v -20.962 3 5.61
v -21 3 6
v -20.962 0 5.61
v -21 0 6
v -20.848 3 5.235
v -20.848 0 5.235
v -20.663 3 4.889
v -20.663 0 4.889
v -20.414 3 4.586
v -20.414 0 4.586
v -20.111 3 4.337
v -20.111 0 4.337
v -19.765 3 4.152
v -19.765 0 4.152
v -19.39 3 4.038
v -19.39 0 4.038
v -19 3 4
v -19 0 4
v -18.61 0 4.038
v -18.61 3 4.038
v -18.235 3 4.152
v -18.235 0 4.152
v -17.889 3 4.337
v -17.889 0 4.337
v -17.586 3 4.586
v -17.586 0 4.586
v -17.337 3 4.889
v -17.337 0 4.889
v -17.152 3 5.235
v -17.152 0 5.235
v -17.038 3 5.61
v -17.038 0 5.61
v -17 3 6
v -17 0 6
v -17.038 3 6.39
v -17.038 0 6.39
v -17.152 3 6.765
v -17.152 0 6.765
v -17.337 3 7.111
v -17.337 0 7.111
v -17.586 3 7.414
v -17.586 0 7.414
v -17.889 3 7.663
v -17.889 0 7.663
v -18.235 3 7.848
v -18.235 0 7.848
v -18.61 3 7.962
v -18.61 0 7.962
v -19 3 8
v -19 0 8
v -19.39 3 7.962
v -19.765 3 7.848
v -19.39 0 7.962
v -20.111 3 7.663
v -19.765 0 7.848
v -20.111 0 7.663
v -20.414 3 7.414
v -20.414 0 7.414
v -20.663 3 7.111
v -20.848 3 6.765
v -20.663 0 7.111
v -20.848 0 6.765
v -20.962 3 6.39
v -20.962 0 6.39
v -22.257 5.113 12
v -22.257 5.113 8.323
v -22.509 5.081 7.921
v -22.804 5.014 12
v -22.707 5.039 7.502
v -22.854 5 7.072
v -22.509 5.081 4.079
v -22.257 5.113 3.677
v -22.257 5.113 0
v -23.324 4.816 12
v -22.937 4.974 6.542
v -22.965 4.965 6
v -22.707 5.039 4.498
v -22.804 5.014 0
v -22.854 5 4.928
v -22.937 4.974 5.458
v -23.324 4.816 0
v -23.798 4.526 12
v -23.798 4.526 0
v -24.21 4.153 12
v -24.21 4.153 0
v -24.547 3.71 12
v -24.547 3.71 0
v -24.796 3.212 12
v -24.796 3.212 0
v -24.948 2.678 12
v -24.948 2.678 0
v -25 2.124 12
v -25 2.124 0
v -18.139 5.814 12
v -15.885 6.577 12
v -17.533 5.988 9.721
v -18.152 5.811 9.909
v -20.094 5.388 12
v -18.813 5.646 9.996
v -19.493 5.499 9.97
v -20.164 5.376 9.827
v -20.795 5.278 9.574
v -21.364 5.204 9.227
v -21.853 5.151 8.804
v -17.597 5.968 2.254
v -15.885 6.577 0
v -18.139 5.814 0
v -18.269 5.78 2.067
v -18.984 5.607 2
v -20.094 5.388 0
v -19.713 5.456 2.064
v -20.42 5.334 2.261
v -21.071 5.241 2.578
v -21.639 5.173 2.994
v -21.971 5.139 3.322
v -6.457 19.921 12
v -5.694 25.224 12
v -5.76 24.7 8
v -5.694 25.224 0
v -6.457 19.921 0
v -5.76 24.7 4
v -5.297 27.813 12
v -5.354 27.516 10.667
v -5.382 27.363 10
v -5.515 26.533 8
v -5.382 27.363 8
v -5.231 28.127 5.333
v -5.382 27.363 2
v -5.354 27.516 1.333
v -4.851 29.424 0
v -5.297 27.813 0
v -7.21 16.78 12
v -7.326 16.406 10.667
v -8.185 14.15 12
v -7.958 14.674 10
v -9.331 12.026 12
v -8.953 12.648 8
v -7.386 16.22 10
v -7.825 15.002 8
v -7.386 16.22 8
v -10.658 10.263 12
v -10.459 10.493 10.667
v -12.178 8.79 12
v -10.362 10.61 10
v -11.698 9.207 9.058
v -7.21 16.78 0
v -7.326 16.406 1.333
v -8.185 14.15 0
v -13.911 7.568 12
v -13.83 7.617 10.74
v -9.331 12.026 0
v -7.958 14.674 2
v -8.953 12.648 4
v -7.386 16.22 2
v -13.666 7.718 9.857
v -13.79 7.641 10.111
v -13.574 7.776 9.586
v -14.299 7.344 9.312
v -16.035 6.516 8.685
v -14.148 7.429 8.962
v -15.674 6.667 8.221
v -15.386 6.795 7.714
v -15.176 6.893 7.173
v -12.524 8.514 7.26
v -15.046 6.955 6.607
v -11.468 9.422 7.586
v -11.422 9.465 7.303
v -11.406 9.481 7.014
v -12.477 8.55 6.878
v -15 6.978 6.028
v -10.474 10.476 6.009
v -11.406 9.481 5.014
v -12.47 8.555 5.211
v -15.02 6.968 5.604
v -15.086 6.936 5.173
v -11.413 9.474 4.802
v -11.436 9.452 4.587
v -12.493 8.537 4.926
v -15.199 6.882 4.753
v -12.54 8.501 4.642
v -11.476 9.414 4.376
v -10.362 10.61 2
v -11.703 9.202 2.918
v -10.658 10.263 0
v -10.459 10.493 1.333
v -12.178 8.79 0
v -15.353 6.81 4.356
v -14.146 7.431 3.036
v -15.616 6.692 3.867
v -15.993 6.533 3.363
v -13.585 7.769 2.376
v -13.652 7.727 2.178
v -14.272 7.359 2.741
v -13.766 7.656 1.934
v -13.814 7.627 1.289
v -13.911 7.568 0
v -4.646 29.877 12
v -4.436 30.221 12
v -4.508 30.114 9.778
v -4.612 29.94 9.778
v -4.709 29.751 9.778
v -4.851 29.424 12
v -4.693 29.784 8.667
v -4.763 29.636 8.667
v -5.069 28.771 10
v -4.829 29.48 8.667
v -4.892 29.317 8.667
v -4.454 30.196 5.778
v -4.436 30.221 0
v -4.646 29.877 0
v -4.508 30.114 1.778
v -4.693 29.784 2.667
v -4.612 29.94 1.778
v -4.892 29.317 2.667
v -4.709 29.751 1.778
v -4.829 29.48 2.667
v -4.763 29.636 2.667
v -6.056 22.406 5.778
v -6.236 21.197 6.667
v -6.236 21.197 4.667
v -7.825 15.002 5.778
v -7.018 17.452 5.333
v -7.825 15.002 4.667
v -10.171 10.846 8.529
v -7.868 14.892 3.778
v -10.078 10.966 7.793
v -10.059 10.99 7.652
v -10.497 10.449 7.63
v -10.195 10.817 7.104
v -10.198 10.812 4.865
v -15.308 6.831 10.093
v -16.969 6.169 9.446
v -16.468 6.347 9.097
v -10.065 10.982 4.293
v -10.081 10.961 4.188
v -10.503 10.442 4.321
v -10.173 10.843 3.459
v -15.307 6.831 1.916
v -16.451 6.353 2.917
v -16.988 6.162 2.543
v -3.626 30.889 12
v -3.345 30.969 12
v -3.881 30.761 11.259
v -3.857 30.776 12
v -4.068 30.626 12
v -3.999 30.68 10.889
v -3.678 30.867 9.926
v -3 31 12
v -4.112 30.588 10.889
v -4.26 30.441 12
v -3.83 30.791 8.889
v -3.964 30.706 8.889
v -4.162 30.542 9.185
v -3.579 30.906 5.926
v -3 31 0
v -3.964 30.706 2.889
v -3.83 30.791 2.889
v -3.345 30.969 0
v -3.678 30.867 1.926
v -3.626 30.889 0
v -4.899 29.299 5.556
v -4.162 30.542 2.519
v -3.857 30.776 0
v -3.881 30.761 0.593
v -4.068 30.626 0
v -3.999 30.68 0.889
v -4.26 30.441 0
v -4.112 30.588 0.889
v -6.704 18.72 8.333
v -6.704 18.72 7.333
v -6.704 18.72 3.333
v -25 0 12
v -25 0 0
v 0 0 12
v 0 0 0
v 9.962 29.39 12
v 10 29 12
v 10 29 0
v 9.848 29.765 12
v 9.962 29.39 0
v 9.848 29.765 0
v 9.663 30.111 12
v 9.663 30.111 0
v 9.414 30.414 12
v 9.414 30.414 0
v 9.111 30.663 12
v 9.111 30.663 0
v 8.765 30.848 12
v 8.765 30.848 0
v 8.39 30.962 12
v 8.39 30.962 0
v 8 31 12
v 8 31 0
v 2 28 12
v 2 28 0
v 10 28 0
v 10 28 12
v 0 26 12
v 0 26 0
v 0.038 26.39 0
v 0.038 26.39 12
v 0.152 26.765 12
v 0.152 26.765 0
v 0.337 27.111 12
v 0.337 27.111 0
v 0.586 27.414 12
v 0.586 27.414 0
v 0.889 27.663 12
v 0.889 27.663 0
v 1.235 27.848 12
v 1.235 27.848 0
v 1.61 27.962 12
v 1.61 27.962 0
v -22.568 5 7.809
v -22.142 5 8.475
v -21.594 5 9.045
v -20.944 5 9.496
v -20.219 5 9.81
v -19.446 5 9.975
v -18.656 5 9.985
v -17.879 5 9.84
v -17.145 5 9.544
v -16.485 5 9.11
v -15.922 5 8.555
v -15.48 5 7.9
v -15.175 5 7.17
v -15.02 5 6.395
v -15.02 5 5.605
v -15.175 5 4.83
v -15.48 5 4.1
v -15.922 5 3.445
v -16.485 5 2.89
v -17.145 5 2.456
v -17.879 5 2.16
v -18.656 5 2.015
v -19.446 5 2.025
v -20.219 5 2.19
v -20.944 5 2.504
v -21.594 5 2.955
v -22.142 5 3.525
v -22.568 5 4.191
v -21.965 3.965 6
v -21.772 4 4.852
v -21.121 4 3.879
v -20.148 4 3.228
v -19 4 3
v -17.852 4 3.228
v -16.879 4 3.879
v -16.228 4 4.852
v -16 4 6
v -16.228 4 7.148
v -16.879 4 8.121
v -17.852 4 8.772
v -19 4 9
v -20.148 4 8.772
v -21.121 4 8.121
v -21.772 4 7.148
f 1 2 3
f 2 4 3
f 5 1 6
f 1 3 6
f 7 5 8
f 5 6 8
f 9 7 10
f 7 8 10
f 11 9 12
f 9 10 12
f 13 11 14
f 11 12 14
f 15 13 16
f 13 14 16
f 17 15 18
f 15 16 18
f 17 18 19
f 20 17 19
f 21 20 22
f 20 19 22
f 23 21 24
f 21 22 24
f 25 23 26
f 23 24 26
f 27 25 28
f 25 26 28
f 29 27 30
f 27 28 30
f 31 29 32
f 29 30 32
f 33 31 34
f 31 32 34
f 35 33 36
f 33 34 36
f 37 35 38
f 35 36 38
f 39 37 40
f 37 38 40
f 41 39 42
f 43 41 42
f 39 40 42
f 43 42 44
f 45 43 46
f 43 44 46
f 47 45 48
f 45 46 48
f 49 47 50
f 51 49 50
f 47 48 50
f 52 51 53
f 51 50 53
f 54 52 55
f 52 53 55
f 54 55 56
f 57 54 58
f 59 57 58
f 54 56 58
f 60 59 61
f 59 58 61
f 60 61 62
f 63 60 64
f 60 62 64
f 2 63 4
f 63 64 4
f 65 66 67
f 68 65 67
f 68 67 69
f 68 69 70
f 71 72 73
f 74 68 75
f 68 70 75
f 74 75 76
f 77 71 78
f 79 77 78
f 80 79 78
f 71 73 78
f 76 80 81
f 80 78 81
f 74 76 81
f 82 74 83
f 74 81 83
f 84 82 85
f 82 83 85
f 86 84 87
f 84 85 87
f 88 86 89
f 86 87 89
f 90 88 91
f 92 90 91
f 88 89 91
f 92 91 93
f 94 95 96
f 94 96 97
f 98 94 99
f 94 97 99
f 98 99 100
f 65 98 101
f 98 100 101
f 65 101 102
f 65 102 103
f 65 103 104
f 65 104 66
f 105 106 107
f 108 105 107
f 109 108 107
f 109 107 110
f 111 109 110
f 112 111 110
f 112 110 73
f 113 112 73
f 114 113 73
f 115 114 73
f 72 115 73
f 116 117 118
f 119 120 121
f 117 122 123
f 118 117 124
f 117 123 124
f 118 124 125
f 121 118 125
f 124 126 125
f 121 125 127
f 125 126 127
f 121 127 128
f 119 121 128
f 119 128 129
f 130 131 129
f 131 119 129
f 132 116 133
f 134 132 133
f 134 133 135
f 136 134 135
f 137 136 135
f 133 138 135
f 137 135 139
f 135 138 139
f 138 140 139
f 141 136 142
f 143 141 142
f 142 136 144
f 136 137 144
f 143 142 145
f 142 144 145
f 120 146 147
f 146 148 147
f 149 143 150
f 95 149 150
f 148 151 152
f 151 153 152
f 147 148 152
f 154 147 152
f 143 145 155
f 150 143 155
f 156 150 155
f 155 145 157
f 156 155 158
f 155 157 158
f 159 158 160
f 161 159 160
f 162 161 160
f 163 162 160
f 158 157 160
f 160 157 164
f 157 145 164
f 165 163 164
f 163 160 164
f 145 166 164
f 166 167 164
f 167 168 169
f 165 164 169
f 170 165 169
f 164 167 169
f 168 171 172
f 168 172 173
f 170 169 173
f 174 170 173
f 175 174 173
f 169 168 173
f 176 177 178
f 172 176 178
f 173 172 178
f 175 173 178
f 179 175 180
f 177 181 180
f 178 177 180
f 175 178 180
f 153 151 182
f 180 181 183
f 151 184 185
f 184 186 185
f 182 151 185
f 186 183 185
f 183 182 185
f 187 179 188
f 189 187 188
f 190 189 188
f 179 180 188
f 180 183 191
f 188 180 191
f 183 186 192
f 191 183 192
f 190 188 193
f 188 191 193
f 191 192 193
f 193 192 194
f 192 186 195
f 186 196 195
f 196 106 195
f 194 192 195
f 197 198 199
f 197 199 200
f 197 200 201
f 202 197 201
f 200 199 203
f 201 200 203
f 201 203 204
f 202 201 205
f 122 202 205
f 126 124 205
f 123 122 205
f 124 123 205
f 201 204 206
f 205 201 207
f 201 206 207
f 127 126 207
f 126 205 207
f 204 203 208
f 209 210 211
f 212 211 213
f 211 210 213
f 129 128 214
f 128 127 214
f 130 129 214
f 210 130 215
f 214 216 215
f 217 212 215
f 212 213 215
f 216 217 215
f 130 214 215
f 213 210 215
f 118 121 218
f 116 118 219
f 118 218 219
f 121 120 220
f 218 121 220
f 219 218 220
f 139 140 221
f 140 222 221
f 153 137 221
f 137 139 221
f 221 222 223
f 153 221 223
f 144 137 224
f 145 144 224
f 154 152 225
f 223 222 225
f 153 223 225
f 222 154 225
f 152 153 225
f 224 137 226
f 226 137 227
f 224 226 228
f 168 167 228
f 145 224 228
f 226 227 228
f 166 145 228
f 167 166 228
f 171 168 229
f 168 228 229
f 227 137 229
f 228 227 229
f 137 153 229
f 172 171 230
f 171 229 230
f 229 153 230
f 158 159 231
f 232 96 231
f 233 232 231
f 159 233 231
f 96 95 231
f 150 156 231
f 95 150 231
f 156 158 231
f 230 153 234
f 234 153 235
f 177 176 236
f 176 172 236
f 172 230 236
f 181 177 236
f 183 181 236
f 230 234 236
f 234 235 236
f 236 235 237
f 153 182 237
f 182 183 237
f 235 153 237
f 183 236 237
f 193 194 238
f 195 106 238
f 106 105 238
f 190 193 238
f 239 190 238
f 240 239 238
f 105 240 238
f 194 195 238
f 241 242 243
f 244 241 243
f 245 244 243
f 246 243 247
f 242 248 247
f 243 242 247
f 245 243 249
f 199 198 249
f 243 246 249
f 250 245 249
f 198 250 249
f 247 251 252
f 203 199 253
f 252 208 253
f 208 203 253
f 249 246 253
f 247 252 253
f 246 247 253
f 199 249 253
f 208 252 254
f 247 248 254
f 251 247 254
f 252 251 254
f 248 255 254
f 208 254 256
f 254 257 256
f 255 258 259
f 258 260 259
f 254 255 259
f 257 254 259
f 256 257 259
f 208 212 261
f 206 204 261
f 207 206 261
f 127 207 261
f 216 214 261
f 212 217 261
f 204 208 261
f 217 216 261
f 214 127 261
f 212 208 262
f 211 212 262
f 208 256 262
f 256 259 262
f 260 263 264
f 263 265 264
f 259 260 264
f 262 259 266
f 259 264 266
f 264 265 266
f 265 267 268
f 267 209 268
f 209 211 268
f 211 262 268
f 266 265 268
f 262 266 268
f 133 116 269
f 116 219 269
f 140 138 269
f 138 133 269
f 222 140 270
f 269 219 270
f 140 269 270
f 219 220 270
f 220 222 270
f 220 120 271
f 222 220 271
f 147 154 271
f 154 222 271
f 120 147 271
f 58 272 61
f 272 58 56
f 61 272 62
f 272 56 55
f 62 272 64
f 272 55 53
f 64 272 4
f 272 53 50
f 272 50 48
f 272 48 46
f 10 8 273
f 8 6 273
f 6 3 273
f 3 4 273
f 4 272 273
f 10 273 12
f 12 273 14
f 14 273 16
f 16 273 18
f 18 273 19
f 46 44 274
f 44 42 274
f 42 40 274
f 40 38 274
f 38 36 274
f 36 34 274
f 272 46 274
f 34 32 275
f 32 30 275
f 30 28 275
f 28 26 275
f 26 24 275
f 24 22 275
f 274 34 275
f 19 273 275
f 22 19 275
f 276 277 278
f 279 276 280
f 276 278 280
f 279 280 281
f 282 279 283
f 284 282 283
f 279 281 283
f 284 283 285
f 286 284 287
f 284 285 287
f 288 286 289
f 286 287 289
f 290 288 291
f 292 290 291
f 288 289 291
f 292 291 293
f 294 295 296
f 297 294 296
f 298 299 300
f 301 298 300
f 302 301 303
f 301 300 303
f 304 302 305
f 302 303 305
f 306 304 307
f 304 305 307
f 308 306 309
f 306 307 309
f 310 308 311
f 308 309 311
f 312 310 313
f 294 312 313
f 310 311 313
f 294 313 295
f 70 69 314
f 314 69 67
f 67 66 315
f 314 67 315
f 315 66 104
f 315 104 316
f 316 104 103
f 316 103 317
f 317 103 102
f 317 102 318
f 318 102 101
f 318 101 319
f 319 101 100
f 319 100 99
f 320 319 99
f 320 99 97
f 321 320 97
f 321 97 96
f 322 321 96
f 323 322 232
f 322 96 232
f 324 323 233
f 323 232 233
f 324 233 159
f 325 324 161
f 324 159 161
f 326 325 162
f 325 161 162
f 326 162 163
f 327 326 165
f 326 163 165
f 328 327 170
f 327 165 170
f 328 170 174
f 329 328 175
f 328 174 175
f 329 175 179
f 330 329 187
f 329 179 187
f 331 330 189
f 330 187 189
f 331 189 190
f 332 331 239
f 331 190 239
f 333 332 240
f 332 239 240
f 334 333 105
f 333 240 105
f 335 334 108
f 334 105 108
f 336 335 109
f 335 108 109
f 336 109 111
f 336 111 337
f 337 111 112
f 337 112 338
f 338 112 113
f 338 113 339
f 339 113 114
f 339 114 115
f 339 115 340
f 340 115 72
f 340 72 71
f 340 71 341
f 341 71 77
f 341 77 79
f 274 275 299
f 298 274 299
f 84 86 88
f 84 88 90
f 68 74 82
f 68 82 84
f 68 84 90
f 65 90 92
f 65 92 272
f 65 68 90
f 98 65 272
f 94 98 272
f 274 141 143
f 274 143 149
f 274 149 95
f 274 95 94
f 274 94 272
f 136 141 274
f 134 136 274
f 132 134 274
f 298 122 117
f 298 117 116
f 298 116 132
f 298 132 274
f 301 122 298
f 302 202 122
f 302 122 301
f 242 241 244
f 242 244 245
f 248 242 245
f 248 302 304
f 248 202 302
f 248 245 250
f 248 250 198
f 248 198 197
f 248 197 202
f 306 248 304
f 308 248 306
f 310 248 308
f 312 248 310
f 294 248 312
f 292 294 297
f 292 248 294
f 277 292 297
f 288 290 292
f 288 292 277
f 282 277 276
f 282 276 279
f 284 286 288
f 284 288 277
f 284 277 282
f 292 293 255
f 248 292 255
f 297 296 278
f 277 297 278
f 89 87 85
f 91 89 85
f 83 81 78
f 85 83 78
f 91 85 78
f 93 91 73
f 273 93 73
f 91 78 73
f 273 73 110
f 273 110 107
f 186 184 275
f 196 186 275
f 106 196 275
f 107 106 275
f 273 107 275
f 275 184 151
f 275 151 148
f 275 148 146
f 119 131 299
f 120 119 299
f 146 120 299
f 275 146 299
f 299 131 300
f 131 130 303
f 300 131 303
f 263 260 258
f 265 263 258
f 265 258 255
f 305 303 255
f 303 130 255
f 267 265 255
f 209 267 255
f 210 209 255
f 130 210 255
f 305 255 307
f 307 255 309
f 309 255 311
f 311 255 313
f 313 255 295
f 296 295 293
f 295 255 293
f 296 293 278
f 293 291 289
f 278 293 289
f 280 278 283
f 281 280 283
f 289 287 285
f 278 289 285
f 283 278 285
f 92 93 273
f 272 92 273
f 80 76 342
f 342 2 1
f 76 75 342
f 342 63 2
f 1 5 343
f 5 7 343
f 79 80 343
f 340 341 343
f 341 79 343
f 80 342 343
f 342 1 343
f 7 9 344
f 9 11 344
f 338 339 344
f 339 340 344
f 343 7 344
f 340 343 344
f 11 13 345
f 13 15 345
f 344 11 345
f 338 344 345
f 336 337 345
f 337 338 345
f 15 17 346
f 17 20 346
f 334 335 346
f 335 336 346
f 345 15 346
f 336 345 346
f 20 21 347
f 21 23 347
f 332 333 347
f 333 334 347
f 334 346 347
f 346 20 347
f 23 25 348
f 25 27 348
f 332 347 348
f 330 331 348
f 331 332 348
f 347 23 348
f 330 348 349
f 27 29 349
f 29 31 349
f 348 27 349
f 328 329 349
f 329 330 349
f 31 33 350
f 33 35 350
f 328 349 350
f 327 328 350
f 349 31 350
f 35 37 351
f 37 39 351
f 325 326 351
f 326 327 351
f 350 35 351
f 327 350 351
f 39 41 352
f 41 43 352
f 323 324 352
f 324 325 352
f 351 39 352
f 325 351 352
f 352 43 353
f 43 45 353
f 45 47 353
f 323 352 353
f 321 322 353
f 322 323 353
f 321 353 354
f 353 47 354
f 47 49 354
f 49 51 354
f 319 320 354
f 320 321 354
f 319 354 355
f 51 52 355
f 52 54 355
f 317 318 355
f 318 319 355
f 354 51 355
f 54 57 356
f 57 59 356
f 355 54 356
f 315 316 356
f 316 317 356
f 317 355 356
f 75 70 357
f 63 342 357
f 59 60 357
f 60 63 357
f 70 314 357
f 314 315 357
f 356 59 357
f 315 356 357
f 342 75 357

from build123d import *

# Parameters (mm, degrees)
F1_DEPTH       = 12
F4_D           = 4
F4_DEPTH       = 5
F4_CSINK_D     = 8
F4_CSINK_ANGLE = 90
F4_TIP         = 1.2017212381
F3_R           = 4
F5_DEPTH       = 26.0010001


with BuildPart() as f1:
    # F0 (on Top) → F1 (new body)
    with BuildSketch(Plane.XY):
        with BuildLine():
            Line((-25, 0), (0, 0))
            Line((0, 0), (0, 26))
            ThreePointArc((0, 26), (0.5857864376, 27.4142135624), (2, 28))
            Line((2, 28), (10, 28))
            Line((10, 28), (10, 29))
            ThreePointArc((10, 29), (9.4142135624, 30.4142135624), (8, 31))
            Line((8, 31), (-3, 31))
            add(Edge.make_bspline(
                [(-3, 31), (-8.7686244949, 31), (-0.6718204217, 6.9665904818), (-22.256677699, 5.1130097266)],
                knots=[0, 0, 0, 0, 32.7453784414, 32.7453784414, 32.7453784414, 32.7453784414], degree=3))
            ThreePointArc((-22.256677699, 5.1130097266), (-24.2102073542, 4.1525526681), (-25, 2.1240104696))
            Line((-25, 2.1240104696), (-25, 0))
        make_face()
    extrude(amount=F1_DEPTH)

    # F4
    with Locations(Plane(origin=(0, 5, 0), x_dir=(1, 0, 0), z_dir=(0, 1, 0))):
        with Locations((-19, -6)):
            CounterSinkHole(F4_D / 2, F4_CSINK_D / 2, depth=F4_DEPTH, counter_sink_angle=F4_CSINK_ANGLE)
            with Locations((0, 0, -(F4_DEPTH + F4_TIP / 2))):  # 118° drill point
                Cone(0, F4_D / 2, F4_TIP, mode=Mode.SUBTRACT)

    # F3 (on offset) → F5 (cut, through all)
    with BuildSketch(Plane.XZ.offset(-5)):
        with Locations((-19, 6)):
            Circle(F3_R)
    extrude(amount=-F5_DEPTH, mode=Mode.SUBTRACT)


solid = f1.part
